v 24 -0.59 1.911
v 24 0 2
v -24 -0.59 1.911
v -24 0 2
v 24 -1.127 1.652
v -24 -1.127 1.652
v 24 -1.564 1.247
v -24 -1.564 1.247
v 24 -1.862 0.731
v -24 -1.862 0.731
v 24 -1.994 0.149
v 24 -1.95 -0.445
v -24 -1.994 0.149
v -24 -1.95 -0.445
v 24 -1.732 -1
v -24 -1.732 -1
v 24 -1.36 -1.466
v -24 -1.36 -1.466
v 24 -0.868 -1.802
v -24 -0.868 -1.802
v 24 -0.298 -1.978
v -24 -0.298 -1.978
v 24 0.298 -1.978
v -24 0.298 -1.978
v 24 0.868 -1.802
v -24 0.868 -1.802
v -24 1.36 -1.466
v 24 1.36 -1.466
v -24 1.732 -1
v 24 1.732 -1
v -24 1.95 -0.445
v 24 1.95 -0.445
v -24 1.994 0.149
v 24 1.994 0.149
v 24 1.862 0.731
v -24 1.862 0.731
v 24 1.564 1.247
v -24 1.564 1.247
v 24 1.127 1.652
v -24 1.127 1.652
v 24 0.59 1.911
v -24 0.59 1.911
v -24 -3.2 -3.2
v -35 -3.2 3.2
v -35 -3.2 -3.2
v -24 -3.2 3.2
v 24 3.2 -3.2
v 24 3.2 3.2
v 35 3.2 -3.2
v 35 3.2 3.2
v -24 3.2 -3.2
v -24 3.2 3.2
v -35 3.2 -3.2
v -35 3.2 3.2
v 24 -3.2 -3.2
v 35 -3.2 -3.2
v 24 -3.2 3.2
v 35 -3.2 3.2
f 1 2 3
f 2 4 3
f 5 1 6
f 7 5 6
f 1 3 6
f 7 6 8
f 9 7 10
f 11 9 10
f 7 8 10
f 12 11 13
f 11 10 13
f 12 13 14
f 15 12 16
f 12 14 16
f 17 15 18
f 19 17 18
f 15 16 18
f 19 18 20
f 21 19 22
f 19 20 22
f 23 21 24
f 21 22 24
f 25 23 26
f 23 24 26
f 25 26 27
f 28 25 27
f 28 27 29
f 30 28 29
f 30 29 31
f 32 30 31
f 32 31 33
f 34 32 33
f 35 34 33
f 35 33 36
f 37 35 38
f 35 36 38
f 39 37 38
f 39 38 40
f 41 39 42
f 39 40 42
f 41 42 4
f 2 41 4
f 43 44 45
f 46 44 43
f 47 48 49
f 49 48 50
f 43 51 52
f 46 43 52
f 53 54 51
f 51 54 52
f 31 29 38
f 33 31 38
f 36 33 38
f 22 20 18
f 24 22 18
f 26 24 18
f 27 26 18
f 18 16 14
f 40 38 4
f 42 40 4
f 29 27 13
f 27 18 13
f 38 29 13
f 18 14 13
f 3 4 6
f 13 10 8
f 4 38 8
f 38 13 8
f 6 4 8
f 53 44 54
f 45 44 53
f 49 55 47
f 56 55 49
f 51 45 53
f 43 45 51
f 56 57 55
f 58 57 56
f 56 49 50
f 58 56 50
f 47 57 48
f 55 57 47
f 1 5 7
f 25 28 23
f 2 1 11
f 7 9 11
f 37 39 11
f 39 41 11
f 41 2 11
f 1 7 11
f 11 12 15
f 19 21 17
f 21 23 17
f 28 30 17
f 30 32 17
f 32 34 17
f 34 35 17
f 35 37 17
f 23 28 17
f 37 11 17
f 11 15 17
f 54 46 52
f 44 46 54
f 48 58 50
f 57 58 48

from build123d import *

# Parameters (mm, degrees)
F2_DEPTH = 3.2
F3_DEPTH = 3.2


with BuildPart() as f1:
    # F0 (on Front) → F1 (revolve)
    with BuildSketch(Plane.XZ):
        Polygon((24, 2), (-24, 2), (-24, 0), (0, 0), (24, 0), align=None)
    revolve(axis=Axis((-12, 0, 0), (1, 0, 0)))


with BuildPart() as f2:
    # F0 (on Front) → F2 (new body, symmetric)
    with BuildSketch(Plane.XZ):
        Polygon((-24, 3.2), (-35, 3.2), (-35, -3.2), (-24, -3.2), (-24, 0), (-24, 2), align=None)
    extrude(amount=F2_DEPTH, both=True)


with BuildPart() as f3:
    # F0 (on Front) → F3 (new body, symmetric)
    with BuildSketch(Plane.XZ):
        Polygon((35, 3.2), (24, 3.2), (24, 2), (24, 0), (24, -3.2), (35, -3.2), align=None)
    extrude(amount=F3_DEPTH, both=True)


solid = Compound([f1.part, f2.part, f3.part])
